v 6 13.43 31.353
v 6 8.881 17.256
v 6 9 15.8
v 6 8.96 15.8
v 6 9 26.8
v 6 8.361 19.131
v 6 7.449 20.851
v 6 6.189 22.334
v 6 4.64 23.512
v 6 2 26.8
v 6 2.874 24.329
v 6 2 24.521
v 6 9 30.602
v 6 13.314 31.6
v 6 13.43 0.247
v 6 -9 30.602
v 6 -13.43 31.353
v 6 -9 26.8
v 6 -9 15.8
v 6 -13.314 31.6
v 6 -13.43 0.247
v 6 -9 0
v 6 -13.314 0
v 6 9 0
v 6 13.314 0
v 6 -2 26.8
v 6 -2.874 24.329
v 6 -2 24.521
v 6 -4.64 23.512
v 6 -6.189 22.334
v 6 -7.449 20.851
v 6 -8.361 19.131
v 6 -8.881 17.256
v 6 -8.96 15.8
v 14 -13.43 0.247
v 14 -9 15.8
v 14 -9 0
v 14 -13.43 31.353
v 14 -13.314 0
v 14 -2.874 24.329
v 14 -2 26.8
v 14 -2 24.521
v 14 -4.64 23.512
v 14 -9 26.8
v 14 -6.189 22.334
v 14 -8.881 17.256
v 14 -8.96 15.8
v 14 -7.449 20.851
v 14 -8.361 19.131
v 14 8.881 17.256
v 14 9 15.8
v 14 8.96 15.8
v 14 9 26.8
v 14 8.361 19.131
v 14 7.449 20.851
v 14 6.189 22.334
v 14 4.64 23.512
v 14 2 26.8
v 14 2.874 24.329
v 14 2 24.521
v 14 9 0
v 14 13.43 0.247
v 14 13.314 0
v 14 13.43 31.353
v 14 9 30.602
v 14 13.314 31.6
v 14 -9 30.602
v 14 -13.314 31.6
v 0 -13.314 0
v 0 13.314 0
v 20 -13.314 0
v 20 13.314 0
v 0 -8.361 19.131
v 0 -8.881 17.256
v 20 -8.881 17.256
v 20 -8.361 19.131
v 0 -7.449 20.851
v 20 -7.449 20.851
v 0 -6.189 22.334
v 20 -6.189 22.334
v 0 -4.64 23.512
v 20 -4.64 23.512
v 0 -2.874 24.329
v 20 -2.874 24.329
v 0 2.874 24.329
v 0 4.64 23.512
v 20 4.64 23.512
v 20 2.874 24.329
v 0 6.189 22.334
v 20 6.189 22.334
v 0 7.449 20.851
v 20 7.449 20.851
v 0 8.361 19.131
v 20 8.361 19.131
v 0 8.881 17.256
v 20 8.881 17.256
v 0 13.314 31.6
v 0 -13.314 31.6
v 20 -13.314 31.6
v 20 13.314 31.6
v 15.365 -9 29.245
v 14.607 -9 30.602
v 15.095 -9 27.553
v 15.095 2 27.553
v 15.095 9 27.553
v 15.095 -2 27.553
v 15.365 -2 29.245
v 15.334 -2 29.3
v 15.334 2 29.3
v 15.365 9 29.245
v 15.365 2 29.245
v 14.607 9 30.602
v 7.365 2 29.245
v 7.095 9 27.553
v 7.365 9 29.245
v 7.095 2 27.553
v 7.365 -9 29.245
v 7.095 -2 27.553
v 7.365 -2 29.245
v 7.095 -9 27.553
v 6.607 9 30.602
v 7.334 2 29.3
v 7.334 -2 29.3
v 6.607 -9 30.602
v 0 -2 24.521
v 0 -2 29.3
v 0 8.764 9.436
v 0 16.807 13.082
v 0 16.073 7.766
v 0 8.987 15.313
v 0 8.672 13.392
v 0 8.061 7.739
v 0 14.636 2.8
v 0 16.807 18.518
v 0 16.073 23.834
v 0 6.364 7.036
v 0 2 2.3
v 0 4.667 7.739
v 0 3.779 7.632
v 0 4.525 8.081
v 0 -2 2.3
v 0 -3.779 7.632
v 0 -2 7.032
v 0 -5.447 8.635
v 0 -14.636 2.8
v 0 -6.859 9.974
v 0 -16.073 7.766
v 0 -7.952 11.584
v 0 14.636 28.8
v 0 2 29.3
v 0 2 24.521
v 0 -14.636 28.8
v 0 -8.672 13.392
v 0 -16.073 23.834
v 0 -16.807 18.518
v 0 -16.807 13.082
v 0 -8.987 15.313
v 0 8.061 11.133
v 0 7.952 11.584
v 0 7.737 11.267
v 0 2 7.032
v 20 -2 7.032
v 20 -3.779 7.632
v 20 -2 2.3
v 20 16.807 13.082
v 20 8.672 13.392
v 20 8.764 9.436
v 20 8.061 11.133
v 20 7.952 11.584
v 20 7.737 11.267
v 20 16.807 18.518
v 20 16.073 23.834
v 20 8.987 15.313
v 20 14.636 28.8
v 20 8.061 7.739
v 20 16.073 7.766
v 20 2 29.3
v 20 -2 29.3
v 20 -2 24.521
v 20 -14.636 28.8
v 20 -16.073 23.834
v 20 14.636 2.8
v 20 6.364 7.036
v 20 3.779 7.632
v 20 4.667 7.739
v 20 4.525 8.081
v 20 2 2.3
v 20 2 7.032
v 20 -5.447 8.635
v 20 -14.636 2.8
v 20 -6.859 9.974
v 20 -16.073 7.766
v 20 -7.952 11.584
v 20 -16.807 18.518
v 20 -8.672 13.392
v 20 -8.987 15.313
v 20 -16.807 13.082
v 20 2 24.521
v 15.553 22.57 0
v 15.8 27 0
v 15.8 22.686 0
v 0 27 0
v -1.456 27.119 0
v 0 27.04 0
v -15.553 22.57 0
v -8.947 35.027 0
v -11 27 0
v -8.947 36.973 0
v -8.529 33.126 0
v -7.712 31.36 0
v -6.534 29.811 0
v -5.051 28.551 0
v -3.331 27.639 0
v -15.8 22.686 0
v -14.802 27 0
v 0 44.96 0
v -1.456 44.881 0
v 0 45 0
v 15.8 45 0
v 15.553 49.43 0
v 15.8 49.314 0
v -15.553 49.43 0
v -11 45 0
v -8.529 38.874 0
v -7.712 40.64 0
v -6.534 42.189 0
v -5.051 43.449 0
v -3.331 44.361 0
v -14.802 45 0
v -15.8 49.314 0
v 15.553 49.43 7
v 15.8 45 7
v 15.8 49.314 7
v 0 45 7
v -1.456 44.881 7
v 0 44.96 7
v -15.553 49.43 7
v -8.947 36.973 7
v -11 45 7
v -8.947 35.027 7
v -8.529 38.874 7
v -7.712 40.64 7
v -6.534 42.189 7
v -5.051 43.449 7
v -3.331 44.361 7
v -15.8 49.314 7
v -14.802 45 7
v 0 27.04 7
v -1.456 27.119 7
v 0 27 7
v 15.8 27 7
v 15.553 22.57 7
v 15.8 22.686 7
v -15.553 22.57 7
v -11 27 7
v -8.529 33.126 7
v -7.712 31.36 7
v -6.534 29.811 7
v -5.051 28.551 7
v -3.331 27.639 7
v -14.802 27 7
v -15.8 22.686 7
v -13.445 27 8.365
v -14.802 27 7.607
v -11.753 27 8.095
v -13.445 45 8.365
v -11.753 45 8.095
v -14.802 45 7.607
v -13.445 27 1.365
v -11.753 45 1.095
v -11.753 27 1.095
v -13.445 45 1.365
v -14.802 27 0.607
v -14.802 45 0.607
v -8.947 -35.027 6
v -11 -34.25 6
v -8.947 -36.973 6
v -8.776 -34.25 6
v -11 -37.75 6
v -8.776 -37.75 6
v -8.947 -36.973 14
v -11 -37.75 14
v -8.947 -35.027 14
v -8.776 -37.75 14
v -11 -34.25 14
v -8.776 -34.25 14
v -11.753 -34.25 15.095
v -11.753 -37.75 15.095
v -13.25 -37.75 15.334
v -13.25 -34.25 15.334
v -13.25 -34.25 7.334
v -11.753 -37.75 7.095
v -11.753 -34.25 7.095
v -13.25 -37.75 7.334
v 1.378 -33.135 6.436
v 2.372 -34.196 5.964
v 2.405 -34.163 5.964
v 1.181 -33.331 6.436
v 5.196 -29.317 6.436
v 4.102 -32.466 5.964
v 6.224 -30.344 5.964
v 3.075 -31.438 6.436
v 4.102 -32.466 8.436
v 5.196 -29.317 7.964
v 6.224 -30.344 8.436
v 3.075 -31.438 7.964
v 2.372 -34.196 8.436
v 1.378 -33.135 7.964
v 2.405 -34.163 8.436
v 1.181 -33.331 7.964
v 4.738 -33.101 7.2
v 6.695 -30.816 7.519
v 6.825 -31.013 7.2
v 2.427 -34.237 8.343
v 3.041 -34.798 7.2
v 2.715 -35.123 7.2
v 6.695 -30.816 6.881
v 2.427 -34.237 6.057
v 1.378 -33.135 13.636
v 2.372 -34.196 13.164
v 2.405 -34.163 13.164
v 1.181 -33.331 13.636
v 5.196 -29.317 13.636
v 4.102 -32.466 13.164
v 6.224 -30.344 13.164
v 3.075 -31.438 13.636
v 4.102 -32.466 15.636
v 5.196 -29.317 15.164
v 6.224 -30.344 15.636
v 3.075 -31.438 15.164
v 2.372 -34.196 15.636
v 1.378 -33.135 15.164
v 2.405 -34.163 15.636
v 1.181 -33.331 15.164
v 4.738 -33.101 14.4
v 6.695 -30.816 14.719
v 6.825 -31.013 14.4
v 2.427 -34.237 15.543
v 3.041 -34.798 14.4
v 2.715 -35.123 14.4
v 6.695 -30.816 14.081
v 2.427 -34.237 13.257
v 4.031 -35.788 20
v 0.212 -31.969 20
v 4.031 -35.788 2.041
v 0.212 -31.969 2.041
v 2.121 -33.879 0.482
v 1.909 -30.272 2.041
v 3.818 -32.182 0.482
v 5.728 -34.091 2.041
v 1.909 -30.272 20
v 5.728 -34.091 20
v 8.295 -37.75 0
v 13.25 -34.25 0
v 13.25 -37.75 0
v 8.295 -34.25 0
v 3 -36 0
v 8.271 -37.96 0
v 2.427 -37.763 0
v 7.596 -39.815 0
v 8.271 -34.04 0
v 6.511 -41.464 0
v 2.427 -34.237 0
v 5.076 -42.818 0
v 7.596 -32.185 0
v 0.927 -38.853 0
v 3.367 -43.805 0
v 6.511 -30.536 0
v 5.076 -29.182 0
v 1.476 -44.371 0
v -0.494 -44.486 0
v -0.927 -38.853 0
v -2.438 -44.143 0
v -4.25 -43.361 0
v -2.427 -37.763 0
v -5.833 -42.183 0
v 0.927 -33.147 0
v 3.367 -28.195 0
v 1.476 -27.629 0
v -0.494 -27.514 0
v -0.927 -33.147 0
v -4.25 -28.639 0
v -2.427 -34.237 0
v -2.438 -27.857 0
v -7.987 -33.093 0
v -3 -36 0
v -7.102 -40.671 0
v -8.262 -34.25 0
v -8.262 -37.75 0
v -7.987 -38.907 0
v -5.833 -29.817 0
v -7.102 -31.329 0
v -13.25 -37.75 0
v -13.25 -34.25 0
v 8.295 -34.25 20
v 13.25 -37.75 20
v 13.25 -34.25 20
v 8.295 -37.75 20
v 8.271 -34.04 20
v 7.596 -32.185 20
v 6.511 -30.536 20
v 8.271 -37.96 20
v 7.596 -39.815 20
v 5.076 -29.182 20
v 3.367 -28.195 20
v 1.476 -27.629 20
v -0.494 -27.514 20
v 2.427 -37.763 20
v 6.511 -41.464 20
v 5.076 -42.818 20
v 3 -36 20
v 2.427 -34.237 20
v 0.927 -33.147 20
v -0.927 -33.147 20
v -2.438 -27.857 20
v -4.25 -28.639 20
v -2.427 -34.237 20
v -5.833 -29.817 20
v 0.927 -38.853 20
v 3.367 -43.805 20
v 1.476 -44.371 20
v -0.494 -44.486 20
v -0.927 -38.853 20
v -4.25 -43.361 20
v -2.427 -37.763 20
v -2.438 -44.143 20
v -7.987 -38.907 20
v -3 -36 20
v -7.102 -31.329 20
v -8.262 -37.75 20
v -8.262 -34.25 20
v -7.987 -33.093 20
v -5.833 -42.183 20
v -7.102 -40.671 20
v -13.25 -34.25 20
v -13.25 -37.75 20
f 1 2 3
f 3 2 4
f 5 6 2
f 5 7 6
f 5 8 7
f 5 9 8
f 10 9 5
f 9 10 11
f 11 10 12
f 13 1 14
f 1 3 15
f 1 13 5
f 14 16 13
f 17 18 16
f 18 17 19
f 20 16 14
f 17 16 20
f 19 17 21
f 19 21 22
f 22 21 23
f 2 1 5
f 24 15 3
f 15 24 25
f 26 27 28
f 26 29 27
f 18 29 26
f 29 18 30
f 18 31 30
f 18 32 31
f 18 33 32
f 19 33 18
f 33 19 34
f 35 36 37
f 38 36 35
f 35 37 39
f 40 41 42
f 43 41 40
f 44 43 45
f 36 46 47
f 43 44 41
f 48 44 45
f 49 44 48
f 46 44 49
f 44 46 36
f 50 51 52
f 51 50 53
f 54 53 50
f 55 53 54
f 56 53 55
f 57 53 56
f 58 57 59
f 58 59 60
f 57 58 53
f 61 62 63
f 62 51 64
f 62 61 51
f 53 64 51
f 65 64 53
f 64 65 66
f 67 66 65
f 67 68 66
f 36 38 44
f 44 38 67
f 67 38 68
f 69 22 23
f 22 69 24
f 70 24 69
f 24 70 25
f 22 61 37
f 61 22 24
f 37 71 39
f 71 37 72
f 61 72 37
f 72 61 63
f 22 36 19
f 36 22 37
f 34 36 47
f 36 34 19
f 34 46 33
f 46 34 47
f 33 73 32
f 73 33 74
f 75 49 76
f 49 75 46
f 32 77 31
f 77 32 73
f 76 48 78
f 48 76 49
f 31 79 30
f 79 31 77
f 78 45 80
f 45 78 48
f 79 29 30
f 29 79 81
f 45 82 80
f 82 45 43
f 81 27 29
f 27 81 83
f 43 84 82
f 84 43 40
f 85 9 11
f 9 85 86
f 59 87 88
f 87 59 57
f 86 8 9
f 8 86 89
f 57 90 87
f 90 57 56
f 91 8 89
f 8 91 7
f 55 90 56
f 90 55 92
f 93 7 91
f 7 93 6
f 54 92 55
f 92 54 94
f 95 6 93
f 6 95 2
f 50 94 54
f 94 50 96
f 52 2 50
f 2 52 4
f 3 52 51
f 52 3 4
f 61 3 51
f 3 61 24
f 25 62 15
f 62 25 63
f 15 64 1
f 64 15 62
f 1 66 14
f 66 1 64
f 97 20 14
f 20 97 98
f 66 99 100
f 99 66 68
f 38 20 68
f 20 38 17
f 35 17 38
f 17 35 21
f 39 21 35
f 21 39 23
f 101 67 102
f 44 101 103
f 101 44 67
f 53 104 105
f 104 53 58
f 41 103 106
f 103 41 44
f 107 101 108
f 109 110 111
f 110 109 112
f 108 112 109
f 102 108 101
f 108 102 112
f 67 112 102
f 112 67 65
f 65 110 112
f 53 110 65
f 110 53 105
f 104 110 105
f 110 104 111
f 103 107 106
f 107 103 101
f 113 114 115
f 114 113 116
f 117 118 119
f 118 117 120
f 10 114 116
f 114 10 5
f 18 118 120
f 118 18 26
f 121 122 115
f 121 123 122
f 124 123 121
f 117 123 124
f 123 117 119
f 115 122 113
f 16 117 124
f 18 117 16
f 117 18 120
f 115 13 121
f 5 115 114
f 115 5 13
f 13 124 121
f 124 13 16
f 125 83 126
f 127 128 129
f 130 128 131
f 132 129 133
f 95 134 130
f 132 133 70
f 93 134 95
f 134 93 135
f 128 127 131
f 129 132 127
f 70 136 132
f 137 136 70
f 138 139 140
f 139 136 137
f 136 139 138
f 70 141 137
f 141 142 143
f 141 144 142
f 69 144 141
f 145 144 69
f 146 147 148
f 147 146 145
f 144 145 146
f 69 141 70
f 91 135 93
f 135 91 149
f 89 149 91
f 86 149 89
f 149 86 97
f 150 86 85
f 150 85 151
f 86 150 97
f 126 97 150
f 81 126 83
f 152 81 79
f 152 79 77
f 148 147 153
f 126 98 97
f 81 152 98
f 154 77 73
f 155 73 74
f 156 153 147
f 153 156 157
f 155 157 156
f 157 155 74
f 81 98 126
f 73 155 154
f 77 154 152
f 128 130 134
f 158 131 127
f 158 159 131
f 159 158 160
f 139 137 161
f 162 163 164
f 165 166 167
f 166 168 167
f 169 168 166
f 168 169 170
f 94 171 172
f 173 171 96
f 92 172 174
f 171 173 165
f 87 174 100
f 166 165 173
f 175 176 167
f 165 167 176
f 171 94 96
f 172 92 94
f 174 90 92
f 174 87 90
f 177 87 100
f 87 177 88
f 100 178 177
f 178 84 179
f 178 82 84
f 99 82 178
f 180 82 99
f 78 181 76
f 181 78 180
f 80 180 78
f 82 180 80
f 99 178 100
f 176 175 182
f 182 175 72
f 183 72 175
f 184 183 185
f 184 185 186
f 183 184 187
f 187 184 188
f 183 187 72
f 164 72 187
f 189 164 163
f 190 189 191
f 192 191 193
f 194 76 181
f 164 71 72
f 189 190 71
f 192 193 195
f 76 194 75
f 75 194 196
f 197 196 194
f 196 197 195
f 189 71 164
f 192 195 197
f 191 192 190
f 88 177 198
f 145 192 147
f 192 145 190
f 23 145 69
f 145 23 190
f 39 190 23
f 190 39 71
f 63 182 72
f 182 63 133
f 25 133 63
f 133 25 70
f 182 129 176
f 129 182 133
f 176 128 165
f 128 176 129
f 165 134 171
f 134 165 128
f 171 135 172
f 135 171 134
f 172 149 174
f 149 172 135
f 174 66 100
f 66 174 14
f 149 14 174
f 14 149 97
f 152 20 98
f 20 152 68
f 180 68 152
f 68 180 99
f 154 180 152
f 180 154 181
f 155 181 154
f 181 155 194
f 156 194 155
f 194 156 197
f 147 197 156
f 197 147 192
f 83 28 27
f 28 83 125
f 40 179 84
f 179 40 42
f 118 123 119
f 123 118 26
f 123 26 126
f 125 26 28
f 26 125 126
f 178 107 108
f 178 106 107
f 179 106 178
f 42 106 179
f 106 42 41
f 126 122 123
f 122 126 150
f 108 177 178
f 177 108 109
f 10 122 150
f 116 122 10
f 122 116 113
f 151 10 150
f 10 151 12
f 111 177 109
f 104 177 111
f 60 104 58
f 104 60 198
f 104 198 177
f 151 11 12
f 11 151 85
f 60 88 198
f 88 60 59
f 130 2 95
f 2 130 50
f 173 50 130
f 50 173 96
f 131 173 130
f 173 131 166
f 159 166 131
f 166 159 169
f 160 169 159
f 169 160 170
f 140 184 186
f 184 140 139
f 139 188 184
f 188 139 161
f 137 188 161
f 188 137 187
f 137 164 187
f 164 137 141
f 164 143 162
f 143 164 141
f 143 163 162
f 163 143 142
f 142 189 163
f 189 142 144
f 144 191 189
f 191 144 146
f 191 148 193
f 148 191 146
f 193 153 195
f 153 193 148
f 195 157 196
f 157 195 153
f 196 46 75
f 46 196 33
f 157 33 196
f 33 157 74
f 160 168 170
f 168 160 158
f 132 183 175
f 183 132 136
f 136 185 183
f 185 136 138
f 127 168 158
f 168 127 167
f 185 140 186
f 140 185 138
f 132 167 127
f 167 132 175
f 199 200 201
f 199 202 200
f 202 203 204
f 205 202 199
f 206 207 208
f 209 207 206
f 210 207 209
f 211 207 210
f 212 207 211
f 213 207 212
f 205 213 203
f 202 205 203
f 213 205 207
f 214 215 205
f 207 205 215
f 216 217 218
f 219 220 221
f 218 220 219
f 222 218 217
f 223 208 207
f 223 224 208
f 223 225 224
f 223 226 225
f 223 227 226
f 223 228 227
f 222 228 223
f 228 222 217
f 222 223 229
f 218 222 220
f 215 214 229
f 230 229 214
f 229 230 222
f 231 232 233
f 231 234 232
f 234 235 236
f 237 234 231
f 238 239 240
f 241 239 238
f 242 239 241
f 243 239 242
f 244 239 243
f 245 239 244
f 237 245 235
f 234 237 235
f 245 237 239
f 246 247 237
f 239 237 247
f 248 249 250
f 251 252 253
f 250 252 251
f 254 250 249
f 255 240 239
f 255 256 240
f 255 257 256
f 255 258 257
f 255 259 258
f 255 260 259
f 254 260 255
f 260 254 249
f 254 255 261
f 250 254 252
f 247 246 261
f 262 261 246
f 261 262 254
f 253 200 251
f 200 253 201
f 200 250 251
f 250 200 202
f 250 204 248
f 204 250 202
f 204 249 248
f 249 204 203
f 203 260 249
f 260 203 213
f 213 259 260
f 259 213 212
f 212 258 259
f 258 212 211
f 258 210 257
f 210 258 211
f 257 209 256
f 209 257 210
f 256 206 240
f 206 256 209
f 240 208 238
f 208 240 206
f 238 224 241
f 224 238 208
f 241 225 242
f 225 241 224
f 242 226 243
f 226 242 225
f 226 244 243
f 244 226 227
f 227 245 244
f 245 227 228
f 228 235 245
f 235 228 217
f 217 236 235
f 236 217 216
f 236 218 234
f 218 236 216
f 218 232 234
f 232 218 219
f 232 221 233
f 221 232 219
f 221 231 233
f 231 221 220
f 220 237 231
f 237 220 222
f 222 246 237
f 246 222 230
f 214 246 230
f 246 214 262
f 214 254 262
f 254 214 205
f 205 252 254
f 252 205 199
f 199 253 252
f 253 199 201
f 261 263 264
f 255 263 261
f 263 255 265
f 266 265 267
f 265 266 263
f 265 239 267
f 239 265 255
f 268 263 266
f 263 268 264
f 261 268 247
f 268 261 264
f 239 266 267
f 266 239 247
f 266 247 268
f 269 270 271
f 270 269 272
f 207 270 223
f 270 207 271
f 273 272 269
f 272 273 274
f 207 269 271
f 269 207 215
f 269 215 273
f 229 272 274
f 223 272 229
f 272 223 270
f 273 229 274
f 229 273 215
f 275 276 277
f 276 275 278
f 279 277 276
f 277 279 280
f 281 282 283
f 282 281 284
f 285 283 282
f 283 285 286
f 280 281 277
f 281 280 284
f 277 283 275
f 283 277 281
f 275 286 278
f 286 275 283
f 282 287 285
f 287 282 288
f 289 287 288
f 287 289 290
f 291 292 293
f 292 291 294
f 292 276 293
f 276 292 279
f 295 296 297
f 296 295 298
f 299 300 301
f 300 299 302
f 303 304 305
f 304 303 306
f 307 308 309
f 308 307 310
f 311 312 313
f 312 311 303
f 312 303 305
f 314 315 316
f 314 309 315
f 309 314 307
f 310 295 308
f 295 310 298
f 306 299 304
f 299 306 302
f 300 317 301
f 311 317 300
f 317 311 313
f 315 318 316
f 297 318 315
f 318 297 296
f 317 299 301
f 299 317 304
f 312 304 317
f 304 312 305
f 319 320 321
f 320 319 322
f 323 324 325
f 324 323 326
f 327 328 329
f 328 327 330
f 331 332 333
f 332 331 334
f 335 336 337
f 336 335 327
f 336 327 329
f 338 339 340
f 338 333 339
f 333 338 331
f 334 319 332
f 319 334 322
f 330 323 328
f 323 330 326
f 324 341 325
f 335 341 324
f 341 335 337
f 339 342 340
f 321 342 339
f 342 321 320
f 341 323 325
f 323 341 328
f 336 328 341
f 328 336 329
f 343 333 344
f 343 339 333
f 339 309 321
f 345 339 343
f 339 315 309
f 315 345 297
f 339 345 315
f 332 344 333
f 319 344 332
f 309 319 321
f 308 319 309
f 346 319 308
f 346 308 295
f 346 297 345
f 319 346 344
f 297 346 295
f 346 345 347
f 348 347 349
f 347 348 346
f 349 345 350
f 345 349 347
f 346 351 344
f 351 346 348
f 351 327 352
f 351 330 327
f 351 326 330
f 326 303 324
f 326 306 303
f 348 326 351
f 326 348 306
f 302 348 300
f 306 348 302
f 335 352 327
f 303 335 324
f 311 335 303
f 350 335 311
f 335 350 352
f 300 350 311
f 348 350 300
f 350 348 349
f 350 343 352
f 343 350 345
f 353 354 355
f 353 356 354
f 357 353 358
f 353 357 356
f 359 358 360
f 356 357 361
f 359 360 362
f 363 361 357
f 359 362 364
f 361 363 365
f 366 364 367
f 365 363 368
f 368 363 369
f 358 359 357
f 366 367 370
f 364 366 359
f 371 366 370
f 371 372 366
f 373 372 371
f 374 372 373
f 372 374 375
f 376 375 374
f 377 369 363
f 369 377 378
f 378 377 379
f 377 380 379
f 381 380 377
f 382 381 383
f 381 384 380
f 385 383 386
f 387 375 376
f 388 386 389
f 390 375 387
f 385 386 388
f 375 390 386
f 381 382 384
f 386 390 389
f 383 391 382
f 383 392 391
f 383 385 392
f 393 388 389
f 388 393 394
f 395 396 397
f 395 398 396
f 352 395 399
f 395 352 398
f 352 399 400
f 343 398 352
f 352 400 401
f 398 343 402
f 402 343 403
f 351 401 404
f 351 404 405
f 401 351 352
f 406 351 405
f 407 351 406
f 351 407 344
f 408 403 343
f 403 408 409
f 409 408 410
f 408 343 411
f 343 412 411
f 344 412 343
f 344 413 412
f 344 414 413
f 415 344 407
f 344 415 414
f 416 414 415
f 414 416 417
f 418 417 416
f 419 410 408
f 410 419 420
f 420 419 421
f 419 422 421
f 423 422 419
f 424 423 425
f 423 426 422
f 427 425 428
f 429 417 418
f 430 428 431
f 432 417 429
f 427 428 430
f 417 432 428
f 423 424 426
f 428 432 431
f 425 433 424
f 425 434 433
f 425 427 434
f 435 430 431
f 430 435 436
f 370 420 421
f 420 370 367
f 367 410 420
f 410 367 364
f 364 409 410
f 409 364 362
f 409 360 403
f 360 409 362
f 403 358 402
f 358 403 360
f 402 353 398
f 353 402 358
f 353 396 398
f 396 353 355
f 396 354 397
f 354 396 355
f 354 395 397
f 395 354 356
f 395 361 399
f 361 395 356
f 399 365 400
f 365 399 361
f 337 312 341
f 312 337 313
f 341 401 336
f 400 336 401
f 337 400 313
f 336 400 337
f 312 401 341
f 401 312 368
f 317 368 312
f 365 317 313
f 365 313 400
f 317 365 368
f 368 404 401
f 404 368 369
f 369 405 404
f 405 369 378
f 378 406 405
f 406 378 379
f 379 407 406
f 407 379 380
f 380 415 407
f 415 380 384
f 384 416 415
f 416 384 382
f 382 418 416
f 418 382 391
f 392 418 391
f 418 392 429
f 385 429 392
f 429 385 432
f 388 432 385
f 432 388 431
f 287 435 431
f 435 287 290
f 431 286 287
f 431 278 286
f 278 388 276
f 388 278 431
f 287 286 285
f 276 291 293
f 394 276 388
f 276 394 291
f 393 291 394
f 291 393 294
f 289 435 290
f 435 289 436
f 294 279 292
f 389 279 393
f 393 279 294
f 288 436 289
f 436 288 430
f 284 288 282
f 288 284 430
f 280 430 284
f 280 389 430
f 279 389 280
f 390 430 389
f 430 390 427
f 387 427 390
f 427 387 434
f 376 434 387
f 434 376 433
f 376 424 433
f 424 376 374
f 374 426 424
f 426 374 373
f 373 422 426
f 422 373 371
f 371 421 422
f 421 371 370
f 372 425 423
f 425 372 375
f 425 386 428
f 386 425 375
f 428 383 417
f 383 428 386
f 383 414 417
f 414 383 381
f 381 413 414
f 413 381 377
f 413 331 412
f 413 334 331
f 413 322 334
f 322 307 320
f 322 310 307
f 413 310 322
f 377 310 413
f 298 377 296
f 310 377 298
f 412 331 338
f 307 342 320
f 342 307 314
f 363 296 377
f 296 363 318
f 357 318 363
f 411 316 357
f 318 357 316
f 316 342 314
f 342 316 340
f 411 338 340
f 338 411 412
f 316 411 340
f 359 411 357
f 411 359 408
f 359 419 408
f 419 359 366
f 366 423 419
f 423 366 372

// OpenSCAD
//
//  Copyright (C) 07-06-2013 Jasper den Ouden.(ojasper.nl)
//
//  This is free software: you can redistribute it and/or modify
//  it under the terms of the GNU General Public License as published
//  by the Free Software Foundation, either version 3 of the License, or
//  (at your option) any later version.
//

//Radius of screw.
r = 3;
//Thicknesses.
t = 4;
//Height.
h = 5*t;
//Outer thickness
ro = 9;

//Extra space.
et = 0.5;

module drill_part_profile()
{   
    difference()
    {   union()
        {   circle(ro-et);
            square([3*ro-et,t-et], center=true);
//            square([t-et, 3*ro-et], center=true);
        }
        circle(r);
    }
}

module receive_part_profile()
{  
    intersection()
    {   square((ro+1.7*t)*[2,3], center=true);
        difference()
        {   scale([2,1.3]) circle(ro+t);
            drill_part_profile(et=0);
            circle(ro);
        }
    }
}

module holder_part_profile()
{
    intersection()
    {   square((ro+1.7*t)*[2,1.7], center=true);
        difference()
        {   scale([2,1.3]) circle(ro+t);
            circle(ro);
            translate([2*ro,0]) square(ro*[4,2], center=true);
        }
    }
}

cr=t/2;
module holder_part()
{   z=2*(t-et);
    difference()
    {   union()
        {   linear_extrude(height=z) holder_part_profile();
            translate([-ro-t,ro,z]) rotate([90,0,0]) scale([1,0.7]) cylinder(r=cr,h=2*ro);
        }
        translate([-ro-t,ro]) rotate([90,0,0]) scale([1,0.7]) cylinder(r=cr,h=2*ro);
    }
}

module receive_part()
{   difference()
    {   linear_extrude(height=h) receive_part_profile();
        translate([0,0,h/2-t]) holder_part(et=0);
        rotate(-45) translate([0,ro]) cylinder(r=0.6*t,h=h);
    }
}
//Nut thickness.
nt = 5.4;
//Nut height.
nh = 2.4;

sr = 1.3;
module nut_profile()
{
    intersection()
    {   square([nt,4*nt], center=true);
        rotate(120) square([nt,4*nt], center=true);
        rotate(240) square([nt,4*nt], center=true);
    }
}

module drill_part()
{   difference()
    {   linear_extrude(height=h) drill_part_profile();
        translate([0,0,h/2-t]) holder_part(et=0);
        
        rotate(-45) translate([0,r+nh,1.5*nh]) rotate([90,0,0]) union()
        {   linear_extrude(height=nh)
            {   nut_profile();
                translate([0,h]) square([nt,2*h],center=true);
            }
            for( z= [1.5*nh: 3*nh : h-3*nh] ) translate([0,z,-r]) cylinder(r=sr,h=2*r);
        }
    }
}

module as_print()
{   translate([0,0,ro+1.7*t]) rotate([0,90,0]) receive_part();
    translate([0,4*ro]) holder_part();
    translate([0,-4*ro]) drill_part();
}

module as_show()
{
    receive_part();
    color([0,0,1]) drill_part();
    color([1,0,0]) translate([0,0,h/2-t]) holder_part();
}
//as_show();
as_print();
